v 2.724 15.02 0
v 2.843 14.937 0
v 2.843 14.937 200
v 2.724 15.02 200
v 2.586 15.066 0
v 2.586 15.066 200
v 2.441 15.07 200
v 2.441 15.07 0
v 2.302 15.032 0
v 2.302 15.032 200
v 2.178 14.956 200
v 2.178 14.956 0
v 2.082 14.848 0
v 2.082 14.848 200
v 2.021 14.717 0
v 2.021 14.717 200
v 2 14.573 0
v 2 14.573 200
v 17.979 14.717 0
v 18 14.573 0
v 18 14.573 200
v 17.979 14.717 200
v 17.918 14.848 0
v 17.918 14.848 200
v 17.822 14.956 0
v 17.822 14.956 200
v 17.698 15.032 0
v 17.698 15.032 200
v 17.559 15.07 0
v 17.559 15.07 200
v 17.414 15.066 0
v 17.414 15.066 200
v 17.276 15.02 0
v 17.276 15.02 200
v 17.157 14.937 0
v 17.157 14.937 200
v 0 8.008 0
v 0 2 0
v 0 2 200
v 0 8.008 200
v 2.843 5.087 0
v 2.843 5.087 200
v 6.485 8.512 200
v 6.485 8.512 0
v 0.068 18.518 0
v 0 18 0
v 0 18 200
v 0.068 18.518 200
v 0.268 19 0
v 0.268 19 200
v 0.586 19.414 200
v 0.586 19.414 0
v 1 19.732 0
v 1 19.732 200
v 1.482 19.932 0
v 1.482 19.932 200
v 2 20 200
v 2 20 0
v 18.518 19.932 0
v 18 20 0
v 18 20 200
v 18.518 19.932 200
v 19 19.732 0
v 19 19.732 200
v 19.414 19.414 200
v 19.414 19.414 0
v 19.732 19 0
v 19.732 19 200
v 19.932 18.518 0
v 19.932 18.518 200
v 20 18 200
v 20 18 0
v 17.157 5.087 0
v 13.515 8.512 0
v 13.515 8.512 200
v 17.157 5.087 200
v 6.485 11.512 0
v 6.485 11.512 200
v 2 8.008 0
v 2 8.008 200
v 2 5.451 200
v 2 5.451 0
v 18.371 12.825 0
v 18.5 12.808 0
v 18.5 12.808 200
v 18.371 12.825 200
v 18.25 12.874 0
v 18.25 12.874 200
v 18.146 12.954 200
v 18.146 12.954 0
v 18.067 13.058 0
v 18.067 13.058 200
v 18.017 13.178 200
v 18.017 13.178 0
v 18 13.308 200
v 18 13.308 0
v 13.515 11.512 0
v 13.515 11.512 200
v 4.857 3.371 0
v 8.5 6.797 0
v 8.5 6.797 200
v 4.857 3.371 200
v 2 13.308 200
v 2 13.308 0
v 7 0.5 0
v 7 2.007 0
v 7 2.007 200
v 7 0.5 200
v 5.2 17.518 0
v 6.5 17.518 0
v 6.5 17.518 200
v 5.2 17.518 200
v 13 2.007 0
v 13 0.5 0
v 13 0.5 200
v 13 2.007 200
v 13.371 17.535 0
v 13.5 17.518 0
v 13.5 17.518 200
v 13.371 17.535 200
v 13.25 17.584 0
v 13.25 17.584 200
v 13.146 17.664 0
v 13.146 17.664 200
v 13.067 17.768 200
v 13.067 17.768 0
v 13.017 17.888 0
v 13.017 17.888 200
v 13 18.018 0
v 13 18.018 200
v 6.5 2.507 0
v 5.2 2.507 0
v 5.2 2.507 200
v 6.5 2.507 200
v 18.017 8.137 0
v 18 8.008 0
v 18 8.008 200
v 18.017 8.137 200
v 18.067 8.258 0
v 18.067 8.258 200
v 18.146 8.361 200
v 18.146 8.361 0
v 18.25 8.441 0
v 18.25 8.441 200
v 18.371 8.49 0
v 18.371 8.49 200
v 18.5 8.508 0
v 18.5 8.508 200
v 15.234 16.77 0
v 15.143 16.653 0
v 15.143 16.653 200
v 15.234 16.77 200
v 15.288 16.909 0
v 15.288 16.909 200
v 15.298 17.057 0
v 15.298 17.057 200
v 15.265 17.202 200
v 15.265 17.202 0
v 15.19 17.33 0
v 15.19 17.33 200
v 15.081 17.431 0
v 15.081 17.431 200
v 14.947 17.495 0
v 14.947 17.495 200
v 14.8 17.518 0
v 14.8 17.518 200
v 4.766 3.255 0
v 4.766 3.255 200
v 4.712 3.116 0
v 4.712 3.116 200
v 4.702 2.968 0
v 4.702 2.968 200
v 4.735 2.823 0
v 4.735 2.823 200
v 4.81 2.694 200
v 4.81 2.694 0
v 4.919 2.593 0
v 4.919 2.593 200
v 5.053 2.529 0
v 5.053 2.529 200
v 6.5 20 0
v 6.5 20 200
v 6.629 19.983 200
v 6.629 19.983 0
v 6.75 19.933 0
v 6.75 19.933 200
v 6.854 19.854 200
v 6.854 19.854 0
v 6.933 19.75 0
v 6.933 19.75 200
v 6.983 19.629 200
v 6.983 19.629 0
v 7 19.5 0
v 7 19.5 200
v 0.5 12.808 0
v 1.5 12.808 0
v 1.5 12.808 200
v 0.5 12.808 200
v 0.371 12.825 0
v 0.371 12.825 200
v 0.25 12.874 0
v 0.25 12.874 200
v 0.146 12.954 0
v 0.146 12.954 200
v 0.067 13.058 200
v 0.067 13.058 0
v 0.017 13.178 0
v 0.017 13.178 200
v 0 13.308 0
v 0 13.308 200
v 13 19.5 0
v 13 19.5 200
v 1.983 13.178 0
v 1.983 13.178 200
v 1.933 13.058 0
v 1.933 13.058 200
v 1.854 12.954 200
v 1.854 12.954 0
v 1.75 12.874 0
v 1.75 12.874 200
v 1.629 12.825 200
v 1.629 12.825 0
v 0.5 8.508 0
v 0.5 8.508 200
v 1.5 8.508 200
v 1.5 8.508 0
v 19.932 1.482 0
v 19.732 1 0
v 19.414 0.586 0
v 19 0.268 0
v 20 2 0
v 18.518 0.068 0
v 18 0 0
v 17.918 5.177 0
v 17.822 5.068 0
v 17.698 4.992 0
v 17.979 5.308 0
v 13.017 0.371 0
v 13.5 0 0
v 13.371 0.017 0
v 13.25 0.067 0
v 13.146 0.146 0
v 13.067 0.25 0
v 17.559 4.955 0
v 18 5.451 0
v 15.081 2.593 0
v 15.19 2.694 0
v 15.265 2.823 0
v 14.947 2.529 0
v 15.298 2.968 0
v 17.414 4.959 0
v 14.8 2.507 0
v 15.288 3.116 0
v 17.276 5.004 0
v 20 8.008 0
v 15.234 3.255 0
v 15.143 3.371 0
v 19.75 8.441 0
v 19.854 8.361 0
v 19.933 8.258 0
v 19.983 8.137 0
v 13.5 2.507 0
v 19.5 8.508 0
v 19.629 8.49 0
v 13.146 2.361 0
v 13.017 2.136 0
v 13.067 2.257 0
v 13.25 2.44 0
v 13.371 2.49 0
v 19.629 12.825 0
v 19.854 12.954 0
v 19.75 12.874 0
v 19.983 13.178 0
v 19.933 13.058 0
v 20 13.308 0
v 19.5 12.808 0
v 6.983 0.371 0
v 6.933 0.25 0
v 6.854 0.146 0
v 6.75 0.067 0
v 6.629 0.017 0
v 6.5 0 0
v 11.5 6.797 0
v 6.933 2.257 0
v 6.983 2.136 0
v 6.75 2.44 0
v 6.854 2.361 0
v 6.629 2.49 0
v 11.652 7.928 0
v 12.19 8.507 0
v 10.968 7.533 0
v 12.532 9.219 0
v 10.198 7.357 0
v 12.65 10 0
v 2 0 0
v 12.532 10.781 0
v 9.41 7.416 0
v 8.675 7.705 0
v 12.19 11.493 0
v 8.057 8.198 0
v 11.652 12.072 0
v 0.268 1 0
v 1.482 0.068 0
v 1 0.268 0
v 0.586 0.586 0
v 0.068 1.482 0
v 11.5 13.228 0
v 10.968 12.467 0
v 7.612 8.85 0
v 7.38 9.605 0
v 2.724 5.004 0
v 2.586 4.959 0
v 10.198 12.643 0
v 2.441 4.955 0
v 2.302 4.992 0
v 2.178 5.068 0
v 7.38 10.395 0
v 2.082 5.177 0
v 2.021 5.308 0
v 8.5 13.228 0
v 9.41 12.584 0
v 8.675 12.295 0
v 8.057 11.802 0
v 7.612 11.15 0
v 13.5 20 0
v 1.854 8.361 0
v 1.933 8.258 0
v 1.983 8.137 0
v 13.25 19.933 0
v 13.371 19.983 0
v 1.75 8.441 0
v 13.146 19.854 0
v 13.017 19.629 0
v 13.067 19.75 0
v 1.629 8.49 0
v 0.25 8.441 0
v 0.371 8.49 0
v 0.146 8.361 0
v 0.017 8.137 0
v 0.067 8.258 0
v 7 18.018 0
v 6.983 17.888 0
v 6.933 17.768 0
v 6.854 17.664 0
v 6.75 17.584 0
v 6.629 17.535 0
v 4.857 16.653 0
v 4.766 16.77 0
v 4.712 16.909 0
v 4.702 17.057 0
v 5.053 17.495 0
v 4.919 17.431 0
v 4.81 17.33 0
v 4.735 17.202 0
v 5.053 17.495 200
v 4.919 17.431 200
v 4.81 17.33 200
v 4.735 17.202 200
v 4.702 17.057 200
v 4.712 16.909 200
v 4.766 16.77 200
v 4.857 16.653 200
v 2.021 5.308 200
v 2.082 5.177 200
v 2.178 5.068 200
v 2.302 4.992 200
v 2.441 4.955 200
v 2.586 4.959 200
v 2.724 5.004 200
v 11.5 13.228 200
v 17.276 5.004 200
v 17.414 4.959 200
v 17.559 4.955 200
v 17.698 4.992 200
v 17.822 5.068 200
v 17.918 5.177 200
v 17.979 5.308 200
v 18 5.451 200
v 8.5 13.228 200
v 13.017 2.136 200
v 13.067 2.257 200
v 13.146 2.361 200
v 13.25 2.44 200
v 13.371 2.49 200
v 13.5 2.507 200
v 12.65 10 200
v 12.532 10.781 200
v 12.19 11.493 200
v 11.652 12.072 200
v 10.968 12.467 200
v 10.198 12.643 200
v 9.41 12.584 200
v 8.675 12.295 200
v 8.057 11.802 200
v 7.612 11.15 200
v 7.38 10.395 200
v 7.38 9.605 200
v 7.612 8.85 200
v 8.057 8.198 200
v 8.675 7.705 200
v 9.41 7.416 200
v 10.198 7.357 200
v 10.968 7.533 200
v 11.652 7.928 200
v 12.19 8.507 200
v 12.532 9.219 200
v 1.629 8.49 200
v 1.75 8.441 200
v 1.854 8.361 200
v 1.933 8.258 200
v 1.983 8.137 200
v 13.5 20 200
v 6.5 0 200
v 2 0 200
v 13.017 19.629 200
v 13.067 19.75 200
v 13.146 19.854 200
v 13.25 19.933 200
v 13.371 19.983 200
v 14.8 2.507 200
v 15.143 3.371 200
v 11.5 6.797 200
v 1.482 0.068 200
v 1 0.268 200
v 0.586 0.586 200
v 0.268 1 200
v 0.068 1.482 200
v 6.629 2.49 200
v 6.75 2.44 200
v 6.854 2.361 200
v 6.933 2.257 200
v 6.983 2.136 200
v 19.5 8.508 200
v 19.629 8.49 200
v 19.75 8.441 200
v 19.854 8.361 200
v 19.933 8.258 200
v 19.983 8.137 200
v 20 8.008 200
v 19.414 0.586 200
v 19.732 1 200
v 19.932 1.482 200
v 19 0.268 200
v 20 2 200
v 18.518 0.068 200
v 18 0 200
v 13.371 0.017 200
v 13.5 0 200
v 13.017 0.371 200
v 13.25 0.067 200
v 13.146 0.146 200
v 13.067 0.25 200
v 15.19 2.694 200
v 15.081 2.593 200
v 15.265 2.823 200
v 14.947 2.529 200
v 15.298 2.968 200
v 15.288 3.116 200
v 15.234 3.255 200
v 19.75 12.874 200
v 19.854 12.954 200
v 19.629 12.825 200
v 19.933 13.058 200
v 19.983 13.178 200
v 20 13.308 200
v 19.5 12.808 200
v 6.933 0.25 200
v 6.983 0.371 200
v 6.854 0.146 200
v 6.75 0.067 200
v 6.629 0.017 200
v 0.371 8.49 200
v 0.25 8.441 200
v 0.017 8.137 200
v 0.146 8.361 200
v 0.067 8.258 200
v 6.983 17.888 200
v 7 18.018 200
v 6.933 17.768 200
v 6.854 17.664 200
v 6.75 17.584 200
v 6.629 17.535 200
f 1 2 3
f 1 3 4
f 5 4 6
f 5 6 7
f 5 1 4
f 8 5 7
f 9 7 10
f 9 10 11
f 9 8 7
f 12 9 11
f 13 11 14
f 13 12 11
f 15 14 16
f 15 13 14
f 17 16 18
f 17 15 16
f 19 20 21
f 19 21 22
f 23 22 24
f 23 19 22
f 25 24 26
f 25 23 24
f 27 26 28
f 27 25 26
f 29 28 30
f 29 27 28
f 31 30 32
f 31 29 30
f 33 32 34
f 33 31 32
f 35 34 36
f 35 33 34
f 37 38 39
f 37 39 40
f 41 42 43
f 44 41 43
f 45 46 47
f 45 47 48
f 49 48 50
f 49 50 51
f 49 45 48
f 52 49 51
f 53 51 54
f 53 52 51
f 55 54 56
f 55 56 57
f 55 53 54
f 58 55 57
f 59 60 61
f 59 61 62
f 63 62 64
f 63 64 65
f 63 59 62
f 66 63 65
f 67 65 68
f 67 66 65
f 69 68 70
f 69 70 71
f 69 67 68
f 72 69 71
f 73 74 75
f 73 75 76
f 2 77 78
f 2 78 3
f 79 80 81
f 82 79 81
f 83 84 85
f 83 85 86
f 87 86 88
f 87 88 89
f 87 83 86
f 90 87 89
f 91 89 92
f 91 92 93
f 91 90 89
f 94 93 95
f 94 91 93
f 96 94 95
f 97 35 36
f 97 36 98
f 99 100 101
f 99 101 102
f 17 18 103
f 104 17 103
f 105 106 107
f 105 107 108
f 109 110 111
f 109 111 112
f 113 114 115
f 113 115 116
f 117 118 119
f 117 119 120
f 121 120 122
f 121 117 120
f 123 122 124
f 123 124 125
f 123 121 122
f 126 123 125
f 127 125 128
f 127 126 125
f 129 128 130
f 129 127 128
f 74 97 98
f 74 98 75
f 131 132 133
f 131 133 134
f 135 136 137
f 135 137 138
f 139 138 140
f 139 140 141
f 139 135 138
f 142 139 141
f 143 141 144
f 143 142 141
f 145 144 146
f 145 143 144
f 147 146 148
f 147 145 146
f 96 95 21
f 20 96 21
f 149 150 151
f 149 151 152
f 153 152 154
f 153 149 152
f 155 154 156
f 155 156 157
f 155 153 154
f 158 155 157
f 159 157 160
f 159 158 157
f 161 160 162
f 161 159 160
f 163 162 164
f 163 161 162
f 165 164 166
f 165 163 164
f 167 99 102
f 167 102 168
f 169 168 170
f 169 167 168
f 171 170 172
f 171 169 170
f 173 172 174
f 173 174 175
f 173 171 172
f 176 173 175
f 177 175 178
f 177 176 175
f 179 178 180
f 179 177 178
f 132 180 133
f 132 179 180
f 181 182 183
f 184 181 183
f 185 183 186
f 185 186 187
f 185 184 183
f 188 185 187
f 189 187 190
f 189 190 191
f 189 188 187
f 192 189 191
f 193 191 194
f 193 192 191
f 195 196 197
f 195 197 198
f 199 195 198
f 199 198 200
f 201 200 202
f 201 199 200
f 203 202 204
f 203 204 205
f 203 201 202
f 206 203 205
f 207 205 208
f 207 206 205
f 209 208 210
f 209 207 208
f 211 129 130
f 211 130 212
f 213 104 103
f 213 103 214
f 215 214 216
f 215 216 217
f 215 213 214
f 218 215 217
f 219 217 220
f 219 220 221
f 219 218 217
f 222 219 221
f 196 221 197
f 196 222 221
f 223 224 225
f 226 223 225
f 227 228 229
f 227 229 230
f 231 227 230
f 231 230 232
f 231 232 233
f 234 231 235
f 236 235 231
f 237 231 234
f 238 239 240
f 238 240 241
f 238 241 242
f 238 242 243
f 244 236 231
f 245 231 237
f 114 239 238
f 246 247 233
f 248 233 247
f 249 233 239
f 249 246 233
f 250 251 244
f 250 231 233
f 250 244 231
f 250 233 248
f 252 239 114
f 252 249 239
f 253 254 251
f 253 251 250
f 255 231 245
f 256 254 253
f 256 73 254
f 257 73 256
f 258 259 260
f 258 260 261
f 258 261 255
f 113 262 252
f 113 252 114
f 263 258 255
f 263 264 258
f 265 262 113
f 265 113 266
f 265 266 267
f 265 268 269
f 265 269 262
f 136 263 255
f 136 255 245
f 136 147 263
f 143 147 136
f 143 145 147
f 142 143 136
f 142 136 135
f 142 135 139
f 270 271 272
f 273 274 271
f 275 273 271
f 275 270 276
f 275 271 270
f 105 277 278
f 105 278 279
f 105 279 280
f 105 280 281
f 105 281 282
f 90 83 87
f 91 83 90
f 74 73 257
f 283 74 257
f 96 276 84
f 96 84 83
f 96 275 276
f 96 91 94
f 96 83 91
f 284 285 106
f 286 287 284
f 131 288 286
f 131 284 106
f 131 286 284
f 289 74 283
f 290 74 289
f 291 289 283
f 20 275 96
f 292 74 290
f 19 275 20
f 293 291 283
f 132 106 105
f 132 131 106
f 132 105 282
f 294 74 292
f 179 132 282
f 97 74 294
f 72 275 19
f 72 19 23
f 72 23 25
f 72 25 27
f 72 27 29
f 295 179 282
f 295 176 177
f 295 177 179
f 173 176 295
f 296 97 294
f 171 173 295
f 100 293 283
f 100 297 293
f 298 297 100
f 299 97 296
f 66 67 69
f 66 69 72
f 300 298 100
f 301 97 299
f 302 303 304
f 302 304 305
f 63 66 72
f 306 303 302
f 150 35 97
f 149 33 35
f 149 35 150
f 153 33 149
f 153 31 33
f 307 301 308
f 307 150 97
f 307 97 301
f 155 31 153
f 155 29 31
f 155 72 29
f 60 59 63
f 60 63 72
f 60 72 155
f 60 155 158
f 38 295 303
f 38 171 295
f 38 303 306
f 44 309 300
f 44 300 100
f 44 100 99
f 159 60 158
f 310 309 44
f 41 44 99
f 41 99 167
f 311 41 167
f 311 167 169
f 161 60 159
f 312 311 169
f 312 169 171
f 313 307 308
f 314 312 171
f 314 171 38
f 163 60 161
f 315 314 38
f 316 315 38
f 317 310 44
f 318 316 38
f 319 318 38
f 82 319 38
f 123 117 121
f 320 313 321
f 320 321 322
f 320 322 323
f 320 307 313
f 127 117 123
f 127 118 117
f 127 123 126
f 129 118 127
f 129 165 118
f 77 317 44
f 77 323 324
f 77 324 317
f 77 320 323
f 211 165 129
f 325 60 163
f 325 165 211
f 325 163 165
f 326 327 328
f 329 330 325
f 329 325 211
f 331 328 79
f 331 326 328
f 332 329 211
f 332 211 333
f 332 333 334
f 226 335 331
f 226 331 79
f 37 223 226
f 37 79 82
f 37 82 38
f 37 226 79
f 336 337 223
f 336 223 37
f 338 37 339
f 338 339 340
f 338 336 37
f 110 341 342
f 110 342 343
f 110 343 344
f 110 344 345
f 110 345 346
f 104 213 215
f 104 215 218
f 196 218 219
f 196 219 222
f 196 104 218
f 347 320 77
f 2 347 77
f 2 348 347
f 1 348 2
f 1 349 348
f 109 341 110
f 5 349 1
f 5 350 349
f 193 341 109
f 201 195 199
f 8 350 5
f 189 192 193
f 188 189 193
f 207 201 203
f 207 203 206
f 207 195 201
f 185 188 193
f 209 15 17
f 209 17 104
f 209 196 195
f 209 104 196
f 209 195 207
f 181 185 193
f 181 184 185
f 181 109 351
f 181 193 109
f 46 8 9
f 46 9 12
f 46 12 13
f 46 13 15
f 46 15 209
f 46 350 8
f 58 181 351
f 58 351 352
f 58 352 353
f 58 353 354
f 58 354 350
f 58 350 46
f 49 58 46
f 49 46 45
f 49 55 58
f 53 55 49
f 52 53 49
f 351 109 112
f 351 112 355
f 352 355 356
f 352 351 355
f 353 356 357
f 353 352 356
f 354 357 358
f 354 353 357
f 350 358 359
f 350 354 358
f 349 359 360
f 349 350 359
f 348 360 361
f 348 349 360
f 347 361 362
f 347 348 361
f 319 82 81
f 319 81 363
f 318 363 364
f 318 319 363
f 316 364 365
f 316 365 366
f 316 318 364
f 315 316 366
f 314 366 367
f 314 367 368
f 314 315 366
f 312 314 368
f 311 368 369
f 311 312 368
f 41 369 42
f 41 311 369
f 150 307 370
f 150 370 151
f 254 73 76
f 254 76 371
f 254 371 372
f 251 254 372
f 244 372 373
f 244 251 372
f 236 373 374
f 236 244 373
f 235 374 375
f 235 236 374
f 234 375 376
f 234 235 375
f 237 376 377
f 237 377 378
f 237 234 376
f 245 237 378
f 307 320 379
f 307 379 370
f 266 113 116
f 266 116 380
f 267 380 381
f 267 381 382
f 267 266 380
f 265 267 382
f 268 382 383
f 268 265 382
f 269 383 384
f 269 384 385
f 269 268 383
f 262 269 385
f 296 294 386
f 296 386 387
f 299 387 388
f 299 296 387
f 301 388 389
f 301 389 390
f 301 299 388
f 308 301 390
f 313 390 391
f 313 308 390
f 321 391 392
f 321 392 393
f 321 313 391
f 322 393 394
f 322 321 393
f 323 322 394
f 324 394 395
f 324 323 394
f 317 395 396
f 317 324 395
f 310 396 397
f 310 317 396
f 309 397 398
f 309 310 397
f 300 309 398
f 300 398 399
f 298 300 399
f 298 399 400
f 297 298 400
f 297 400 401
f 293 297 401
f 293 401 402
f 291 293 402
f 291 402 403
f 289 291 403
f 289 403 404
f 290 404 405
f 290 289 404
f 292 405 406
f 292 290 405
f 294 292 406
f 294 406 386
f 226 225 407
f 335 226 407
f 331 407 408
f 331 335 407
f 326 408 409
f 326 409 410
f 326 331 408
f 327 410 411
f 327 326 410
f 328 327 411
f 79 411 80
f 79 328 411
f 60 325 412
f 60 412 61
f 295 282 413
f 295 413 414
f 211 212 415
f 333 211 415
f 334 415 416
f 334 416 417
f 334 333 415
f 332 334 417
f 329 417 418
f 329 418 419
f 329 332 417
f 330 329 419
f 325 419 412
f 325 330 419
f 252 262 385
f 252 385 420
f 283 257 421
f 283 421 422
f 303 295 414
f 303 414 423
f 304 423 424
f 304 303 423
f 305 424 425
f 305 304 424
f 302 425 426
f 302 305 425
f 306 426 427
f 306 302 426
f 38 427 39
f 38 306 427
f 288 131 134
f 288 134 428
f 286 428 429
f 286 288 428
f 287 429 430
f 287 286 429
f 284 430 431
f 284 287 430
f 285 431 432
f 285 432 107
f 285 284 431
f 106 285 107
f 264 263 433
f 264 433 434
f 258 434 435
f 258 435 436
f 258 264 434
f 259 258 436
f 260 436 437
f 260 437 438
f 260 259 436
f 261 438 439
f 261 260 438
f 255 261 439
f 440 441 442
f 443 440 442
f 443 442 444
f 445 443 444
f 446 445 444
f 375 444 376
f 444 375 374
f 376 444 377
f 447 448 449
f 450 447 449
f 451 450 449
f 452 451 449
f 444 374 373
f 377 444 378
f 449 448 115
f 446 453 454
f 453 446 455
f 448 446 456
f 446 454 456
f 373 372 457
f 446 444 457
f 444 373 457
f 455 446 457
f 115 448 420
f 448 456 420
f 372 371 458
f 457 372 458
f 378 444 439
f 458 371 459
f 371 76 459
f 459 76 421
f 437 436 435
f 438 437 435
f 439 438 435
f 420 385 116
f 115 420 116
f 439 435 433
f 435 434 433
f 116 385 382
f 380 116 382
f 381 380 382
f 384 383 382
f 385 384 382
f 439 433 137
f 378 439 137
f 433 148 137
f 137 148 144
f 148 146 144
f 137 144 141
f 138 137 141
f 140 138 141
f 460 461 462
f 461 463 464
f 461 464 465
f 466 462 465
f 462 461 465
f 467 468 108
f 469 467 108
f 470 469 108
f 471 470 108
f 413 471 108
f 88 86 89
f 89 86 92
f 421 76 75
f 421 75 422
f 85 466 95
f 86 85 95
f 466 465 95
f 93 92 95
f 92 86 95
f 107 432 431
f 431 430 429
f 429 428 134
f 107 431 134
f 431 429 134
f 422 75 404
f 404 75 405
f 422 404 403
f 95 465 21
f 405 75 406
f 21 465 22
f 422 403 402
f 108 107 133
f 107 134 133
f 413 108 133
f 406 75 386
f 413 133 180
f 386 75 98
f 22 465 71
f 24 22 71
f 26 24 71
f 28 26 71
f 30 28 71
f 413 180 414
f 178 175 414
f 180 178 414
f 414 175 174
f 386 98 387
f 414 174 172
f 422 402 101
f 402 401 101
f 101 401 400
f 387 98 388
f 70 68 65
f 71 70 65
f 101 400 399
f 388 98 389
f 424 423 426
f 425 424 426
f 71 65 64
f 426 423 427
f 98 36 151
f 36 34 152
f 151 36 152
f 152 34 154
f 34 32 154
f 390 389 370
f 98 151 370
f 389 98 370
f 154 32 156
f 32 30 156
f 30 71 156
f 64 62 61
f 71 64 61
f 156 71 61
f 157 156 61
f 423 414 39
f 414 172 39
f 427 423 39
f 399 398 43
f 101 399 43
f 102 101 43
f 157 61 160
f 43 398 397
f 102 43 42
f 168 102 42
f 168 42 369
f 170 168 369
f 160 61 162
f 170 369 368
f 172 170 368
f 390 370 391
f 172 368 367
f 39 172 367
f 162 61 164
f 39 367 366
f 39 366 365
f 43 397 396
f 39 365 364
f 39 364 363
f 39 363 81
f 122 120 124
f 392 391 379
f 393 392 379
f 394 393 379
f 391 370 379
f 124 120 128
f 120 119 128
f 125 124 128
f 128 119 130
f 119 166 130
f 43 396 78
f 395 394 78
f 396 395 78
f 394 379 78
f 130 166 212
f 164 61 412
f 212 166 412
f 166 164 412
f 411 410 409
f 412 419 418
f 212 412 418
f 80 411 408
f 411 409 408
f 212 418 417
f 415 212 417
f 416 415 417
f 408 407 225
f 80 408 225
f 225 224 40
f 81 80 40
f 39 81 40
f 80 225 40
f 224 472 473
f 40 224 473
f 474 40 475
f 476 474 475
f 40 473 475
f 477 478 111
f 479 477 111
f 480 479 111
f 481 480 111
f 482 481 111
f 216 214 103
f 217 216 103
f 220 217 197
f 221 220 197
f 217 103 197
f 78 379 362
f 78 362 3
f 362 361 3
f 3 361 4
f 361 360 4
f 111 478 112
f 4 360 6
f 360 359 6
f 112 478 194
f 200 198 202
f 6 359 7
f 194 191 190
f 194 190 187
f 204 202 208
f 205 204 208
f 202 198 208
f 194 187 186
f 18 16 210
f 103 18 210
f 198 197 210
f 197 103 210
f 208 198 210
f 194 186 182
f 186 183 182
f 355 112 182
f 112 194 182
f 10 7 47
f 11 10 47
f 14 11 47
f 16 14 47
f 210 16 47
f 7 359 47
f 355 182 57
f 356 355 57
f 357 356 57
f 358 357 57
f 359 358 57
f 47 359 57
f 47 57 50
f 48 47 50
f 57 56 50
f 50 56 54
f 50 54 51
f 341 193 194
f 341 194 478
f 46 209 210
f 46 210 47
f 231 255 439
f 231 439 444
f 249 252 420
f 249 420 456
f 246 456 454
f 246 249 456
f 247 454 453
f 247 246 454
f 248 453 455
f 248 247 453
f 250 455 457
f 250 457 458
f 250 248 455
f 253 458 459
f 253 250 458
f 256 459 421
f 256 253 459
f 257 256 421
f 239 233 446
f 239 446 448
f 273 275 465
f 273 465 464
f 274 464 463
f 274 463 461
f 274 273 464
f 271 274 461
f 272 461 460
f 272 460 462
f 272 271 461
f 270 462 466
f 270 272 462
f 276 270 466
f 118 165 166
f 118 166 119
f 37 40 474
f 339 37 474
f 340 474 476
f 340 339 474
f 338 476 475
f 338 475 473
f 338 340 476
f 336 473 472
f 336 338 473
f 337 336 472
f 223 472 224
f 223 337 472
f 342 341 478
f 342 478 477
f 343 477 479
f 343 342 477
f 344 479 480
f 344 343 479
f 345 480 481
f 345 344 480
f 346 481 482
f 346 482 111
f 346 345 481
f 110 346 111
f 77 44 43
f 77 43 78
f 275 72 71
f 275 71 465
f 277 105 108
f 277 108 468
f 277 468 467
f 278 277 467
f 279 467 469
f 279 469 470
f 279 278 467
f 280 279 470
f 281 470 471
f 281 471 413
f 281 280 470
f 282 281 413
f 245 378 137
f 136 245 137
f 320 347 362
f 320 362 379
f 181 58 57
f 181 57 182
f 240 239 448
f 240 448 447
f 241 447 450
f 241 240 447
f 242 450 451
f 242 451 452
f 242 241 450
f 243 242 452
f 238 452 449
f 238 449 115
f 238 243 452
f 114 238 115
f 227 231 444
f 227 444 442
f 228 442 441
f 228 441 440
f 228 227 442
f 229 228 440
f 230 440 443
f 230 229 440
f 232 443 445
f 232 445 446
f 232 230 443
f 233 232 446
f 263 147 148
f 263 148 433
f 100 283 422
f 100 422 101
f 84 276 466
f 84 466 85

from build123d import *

# Parameters (mm, degrees)
SKETCH2_R           = 2.65
BOSS_EXTRUDE1_DEPTH = 200


with BuildPart() as part:
    # Sketch2 → Boss-Extrude1 (new body)
    with BuildSketch(Plane.XY):
        with BuildLine():
            Line((0, 2), (0, 8.007512652))
            ThreePointArc((0, 8.007512652), (0.146446609, 8.361066043), (0.5, 8.507512652))
            Line((0.5, 8.507512652), (1.5, 8.507512652))
            ThreePointArc((1.5, 8.507512652), (1.853553391, 8.361066043), (2, 8.007512652))
            Line((2, 8.007512652), (2, 5.451323229))
            ThreePointArc((2, 5.451323229), (2.301581692, 4.992378598), (2.842520699, 5.087071159))
            Line((2.842520699, 5.087071159), (6.485041399, 8.512278154))
            Line((6.485041399, 8.512278154), (6.485041399, 11.512278154))
            Line((6.485041399, 11.512278154), (2.842520699, 14.937485148))
            ThreePointArc((2.842520699, 14.937485148), (2.301581692, 15.03217771), (2, 14.573233078))
            Line((2, 14.573233078), (2, 13.307512652))
            ThreePointArc((2, 13.307512652), (1.853553391, 12.953959262), (1.5, 12.807512652))
            Line((1.5, 12.807512652), (0.5, 12.807512652))
            ThreePointArc((0.5, 12.807512652), (0.146446609, 12.953959262), (0, 13.307512652))
            Line((0, 13.307512652), (0, 18))
            ThreePointArc((0, 18), (0.585786438, 19.414213562), (2, 20))
            Line((2, 20), (6.5, 20))
            ThreePointArc((6.5, 20), (6.853553391, 19.853553391), (7, 19.5))
            Line((7, 19.5), (7, 18.017502122))
            ThreePointArc((7, 18.017502122), (6.853553391, 17.663948732), (6.5, 17.517502122))
            Line((6.5, 17.517502122), (5.2, 17.517502122))
            ThreePointArc((5.2, 17.517502122), (4.735174207, 17.201722052), (4.857479301, 16.653250052))
            Line((4.857479301, 16.653250052), (8.5, 13.228043058))
            Line((8.5, 13.228043058), (11.5, 13.228043058))
            Line((11.5, 13.228043058), (15.142520699, 16.653250052))
            ThreePointArc((15.142520699, 16.653250052), (15.264825793, 17.201722052), (14.8, 17.517502122))
            Line((14.8, 17.517502122), (13.5, 17.517502122))
            ThreePointArc((13.5, 17.517502122), (13.146446609, 17.663948732), (13, 18.017502122))
            Line((13, 18.017502122), (13, 19.5))
            ThreePointArc((13, 19.5), (13.146446609, 19.853553391), (13.5, 20))
            Line((13.5, 20), (18, 20))
            ThreePointArc((18, 20), (19.414213562, 19.414213562), (20, 18))
            Line((20, 18), (20, 13.307512652))
            ThreePointArc((20, 13.307512652), (19.853553391, 12.953959262), (19.5, 12.807512652))
            Line((19.5, 12.807512652), (18.5, 12.807512652))
            ThreePointArc((18.5, 12.807512652), (18.146446609, 12.953959262), (18, 13.307512652))
            Line((18, 13.307512652), (18, 14.573233078))
            ThreePointArc((18, 14.573233078), (17.698418308, 15.03217771), (17.157479301, 14.937485148))
            Line((17.157479301, 14.937485148), (13.514958601, 11.512278154))
            Line((13.514958601, 11.512278154), (13.514958601, 8.512278154))
            Line((13.514958601, 8.512278154), (17.157479301, 5.087071159))
            ThreePointArc((17.157479301, 5.087071159), (17.698418308, 4.992378598), (18, 5.451323229))
            Line((18, 5.451323229), (18, 8.007512652))
            ThreePointArc((18, 8.007512652), (18.146446609, 8.361066043), (18.5, 8.507512652))
            Line((18.5, 8.507512652), (19.5, 8.507512652))
            ThreePointArc((19.5, 8.507512652), (19.853553391, 8.361066043), (20, 8.007512652))
            Line((20, 8.007512652), (20, 2))
            ThreePointArc((20, 2), (19.414213562, 0.585786438), (18, 0))
            Line((18, 0), (13.5, 0))
            ThreePointArc((13.5, 0), (13.146446609, 0.146446609), (13, 0.5))
            Line((13, 0.5), (13, 2.007054185))
            ThreePointArc((13, 2.007054185), (13.146446609, 2.360607576), (13.5, 2.507054185))
            Line((13.5, 2.507054185), (14.8, 2.507054185))
            ThreePointArc((14.8, 2.507054185), (15.264825793, 2.822834256), (15.142520699, 3.371306255))
            Line((15.142520699, 3.371306255), (11.5, 6.79651325))
            Line((11.5, 6.79651325), (8.5, 6.79651325))
            Line((8.5, 6.79651325), (4.857479301, 3.371306255))
            ThreePointArc((4.857479301, 3.371306255), (4.735174207, 2.822834256), (5.2, 2.507054185))
            Line((5.2, 2.507054185), (6.5, 2.507054185))
            ThreePointArc((6.5, 2.507054185), (6.853553391, 2.360607576), (7, 2.007054185))
            Line((7, 2.007054185), (7, 0.5))
            ThreePointArc((7, 0.5), (6.853553391, 0.146446609), (6.5, 0))
            Line((6.5, 0), (2, 0))
            ThreePointArc((2, 0), (0.585786438, 0.585786438), (0, 2))
        make_face()
        with Locations((10, 10)):
            Circle(SKETCH2_R, mode=Mode.SUBTRACT)
    extrude(amount=BOSS_EXTRUDE1_DEPTH)


solid = part.part
